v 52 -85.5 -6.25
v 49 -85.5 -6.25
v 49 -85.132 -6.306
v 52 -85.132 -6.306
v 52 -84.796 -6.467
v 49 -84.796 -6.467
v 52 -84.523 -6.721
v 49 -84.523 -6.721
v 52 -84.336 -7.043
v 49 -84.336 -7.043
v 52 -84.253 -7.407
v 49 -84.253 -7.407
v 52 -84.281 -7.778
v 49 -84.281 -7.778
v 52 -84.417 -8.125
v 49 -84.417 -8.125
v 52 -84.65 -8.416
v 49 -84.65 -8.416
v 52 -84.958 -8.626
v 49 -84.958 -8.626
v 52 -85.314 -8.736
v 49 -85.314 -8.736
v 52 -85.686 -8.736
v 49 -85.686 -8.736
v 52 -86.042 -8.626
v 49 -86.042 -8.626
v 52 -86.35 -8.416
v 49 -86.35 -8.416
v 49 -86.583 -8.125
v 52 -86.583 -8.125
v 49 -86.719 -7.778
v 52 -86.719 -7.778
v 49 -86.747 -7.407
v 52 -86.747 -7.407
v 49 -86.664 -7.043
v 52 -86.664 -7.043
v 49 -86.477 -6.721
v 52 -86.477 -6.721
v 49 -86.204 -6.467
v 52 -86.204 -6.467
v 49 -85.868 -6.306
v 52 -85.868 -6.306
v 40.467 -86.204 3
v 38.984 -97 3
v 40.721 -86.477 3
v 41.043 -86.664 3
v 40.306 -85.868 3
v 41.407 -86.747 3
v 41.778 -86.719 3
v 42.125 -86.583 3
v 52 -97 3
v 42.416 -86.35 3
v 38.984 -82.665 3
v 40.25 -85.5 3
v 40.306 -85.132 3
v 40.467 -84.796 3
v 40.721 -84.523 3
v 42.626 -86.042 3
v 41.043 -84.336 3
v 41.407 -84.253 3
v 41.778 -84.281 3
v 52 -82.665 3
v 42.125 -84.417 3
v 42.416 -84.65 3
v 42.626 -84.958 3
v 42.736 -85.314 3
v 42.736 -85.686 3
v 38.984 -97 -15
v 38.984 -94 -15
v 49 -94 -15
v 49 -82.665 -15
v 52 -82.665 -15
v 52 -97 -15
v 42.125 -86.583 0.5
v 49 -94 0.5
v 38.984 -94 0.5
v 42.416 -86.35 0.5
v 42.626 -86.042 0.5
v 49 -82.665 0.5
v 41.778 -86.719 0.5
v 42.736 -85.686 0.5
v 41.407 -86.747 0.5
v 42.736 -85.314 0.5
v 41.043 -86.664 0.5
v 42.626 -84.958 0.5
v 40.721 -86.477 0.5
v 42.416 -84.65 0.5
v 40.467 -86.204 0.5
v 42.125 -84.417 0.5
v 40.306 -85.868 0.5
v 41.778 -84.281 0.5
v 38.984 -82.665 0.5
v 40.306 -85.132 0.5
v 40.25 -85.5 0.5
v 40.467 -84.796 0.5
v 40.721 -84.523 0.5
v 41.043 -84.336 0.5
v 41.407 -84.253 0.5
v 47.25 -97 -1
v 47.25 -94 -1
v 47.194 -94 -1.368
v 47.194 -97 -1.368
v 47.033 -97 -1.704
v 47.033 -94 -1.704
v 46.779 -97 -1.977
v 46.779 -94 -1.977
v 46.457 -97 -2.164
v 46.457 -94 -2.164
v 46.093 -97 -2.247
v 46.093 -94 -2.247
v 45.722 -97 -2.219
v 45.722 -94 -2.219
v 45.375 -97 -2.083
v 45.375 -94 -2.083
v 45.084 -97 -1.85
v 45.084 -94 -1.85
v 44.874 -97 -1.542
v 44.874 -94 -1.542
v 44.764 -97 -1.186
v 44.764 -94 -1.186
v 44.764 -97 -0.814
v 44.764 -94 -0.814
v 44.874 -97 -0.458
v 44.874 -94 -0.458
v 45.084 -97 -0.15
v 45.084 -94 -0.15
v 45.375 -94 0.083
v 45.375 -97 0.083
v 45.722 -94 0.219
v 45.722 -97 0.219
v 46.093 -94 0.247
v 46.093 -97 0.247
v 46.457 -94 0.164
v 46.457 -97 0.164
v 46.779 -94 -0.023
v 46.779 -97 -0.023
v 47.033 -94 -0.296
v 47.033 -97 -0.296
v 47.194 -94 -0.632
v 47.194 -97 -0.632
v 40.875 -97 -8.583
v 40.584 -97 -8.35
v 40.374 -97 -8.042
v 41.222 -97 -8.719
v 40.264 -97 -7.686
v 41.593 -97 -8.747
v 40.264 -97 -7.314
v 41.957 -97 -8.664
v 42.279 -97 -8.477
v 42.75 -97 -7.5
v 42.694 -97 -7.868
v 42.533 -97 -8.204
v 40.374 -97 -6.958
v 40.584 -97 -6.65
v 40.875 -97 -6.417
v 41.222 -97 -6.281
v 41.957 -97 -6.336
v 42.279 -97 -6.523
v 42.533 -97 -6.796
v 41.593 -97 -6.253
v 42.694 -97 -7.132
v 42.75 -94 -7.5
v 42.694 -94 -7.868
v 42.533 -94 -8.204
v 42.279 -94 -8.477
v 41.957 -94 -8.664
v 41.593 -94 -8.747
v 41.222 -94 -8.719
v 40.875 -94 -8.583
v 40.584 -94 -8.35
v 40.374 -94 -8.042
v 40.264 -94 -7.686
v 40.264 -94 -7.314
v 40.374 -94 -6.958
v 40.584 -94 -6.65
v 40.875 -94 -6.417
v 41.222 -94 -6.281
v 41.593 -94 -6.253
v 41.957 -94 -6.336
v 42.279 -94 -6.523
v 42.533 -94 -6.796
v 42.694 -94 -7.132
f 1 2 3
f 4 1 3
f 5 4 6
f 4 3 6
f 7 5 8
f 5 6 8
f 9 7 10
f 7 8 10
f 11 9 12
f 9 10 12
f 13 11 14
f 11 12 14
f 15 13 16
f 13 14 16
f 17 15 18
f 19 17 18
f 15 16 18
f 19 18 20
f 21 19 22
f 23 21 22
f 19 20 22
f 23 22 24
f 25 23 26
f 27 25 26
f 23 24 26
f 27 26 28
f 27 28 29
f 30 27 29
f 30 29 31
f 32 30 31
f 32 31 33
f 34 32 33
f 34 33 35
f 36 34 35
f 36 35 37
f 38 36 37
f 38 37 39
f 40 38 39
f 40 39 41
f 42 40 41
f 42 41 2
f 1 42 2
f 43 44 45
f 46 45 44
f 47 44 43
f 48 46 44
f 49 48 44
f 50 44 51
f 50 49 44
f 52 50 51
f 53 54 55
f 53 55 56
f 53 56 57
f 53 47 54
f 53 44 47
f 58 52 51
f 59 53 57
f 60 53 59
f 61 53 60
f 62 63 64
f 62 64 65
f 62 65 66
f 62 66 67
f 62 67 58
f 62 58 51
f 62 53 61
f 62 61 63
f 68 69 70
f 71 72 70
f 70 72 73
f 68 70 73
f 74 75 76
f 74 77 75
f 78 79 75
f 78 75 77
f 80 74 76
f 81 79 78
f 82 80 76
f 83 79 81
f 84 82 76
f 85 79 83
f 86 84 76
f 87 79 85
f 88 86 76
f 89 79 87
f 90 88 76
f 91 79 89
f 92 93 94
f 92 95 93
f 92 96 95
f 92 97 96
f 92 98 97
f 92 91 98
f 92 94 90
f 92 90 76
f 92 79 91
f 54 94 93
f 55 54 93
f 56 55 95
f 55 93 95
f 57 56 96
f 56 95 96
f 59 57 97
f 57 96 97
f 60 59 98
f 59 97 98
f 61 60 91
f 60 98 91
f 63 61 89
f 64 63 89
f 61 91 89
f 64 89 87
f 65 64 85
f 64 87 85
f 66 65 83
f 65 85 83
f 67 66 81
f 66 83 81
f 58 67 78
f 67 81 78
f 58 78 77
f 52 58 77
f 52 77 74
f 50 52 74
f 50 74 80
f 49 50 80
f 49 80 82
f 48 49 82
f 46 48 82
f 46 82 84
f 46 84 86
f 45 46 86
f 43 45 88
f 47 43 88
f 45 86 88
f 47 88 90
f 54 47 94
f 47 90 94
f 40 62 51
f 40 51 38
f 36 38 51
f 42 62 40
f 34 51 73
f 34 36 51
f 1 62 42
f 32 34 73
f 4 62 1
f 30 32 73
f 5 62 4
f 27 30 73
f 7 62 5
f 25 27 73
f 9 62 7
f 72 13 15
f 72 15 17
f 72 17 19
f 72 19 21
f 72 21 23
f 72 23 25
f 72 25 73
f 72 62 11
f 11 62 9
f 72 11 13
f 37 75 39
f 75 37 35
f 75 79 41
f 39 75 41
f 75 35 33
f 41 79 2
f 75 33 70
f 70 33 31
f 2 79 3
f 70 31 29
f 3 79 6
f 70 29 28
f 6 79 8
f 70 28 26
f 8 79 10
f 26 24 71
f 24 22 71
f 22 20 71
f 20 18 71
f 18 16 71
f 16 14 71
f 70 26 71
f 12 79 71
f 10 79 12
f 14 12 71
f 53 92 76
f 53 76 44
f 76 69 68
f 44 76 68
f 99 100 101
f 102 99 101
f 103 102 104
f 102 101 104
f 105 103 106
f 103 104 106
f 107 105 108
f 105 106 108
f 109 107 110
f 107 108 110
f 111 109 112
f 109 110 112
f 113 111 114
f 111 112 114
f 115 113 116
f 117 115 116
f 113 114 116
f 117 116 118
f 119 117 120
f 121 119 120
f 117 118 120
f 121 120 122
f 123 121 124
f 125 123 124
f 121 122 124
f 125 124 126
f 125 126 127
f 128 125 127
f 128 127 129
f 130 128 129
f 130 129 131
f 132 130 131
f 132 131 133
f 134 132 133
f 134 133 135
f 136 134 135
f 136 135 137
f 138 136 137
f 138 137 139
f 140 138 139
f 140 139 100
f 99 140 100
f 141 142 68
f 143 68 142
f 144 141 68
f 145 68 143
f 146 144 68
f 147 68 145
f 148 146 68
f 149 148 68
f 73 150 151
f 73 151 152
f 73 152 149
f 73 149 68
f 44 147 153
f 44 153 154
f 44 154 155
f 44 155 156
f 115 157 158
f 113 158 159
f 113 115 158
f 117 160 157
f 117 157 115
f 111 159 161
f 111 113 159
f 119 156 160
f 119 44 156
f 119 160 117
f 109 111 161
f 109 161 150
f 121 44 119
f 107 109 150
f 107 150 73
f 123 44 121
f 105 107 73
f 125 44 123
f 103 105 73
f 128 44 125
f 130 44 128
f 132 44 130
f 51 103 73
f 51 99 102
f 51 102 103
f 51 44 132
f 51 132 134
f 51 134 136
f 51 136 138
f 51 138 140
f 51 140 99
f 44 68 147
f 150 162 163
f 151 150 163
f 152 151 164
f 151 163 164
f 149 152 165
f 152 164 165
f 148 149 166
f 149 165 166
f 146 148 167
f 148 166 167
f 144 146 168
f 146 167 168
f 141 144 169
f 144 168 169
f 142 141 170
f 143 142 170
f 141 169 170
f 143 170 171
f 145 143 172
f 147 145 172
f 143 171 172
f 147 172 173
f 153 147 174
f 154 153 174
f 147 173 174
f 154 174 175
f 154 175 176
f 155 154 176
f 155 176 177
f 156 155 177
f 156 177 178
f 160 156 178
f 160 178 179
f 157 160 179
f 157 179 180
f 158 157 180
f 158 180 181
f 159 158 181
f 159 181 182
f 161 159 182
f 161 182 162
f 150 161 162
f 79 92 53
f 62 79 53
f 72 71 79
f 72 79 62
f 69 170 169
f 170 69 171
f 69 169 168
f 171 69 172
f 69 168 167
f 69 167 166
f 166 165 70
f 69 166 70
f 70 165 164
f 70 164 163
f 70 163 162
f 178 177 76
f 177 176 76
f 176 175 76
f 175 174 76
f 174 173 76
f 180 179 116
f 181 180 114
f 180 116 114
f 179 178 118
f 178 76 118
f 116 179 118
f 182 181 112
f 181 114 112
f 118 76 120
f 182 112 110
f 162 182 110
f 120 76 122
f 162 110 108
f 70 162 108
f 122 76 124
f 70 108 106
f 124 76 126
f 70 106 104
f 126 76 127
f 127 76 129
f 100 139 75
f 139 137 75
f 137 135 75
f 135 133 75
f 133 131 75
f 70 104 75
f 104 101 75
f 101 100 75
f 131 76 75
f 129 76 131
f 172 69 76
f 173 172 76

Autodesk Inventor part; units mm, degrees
ref_plane "YZ Plane" through (0, 0, 0) normal (1, 0, 0) x (0, 1, 0)
ref_plane "XZ Plane" through (0, 0, 0) normal (0, 1, 0) x (-1, 0, 0)
ref_plane "XY Plane" through (0, 0, 0) normal (0, 0, 1) x (1, 0, 0)
ref_plane "작업 평면1" through (0, 0, 0) normal (0, 0, 1) x (1, 0, 0)
sketch "스케치1" plane through (0, 0, 0) normal (0, 0, 1) x (1, 0, 0)
  line L0 (49, -94) -> (-72, -94) construction
  line L1 (49, -88) -> (49, -94) construction
  line L2 (-72, -88) -> (49, -88) construction
  line L3 (-72, -94) -> (-72, -88) construction
  line L4 (43, 88) -> (43, -88) construction
  line L5 (49, -88) -> (43, -88) construction
  line L6 (49, 88) -> (49, -88) construction
  line L7 (49, 88) -> (43, 88) construction
  line L8 (-72, -88) -> (43, -88) construction
  line L9 (43, -88) -> (43, 88) construction
  line L10 (-72, 88) -> (43, 88) construction
  line L11 (-72, 88) -> (-72, -88) construction
  circle A0 centre (-2.8299, 17.3) radius 1.35 construction
  circle A1 centre (19.1701, -17.3) radius 1.35 construction
  circle A2 centre (-24.8299, 17.3) radius 1.35 construction
  circle A3 centre (19.1701, 17.3) radius 1.35 construction
  circle A4 centre (-2.8299, -17.3) radius 1.35 construction
  circle A5 centre (-24.8299, -17.3) radius 1.35 construction
  arc A6 (-27.4299, -13.5) -> (-26.3299, -14.6) centre (-26.3299, -13.5) ccw construction
  line L12 (-27.4299, -13.5) -> (-27.4299, 13.5) construction
  arc A7 (-26.3299, 14.6) -> (-27.4299, 13.5) centre (-26.3299, 13.5) ccw construction
  line L13 (-26.3299, 14.6) -> (28.6701, 14.6) construction
  line L14 (28.6701, 14.6) -> (28.6701, -14.6) construction
  line L15 (28.6701, -14.6) -> (-26.3299, -14.6) construction
  line L16 (-72, -88) -> (43, -88) construction
  line L17 (43, -88) -> (43, 88) construction
  line L18 (-72, 88) -> (43, 88) construction
  line L19 (-72, 88) -> (-72, -88) construction
  circle A8 centre (-2.8299, 17.3) radius 1.35 construction
  circle A9 centre (19.1701, -17.3) radius 1.35 construction
  circle A10 centre (-24.8299, 17.3) radius 1.35 construction
  circle A11 centre (19.1701, 17.3) radius 1.35 construction
  circle A12 centre (-2.8299, -17.3) radius 1.35 construction
  circle A13 centre (-24.8299, -17.3) radius 1.35 construction
  arc A14 (-27.4299, -13.5) -> (-26.3299, -14.6) centre (-26.3299, -13.5) ccw construction
  line L20 (-27.4299, -13.5) -> (-27.4299, 13.5) construction
  arc A15 (-26.3299, 14.6) -> (-27.4299, 13.5) centre (-26.3299, 13.5) ccw construction
  line L21 (-26.3299, 14.6) -> (28.6701, 14.6) construction
  line L22 (28.6701, 14.6) -> (28.6701, -14.6) construction
  line L23 (28.6701, -14.6) -> (-26.3299, -14.6) construction
  line L24 (43, 88) -> (43, -88) projected
  line L25 (49, -88) -> (43, -88) projected
  line L26 (49, 88) -> (49, -88) projected
  line L27 (49, 88) -> (43, 88) projected
  line L28 (49, -94) -> (-72, -94) projected
  line L29 (49, -88) -> (49, -94) projected
  line L30 (-72, -88) -> (49, -88) projected
  line L31 (-72, -94) -> (-72, -88) projected
  line L32 (-72, -88) -> (43, -88) projected
  line L33 (43, -88) -> (43, 88) projected
  line L34 (-72, 88) -> (43, 88) projected
  line L35 (-72, 88) -> (-72, -88) projected
  circle A16 centre (-2.8299, 17.3) radius 1.35 projected
  circle A17 centre (19.1701, -17.3) radius 1.35 projected
  circle A18 centre (-24.8299, 17.3) radius 1.35 projected
  circle A19 centre (19.1701, 17.3) radius 1.35 projected
  circle A20 centre (-2.8299, -17.3) radius 1.35 projected
  circle A21 centre (-24.8299, -17.3) radius 1.35 projected
  arc A22 (-27.4299, -13.5) -> (-26.3299, -14.6) centre (-26.3299, -13.5) ccw projected
  line L36 (-27.4299, -13.5) -> (-27.4299, 13.5) projected
  arc A23 (-26.3299, 14.6) -> (-27.4299, 13.5) centre (-26.3299, 13.5) ccw projected
  line L37 (-26.3299, 14.6) -> (28.6701, 14.6) projected
  line L38 (28.6701, 14.6) -> (28.6701, -14.6) projected
  line L39 (28.6701, -14.6) -> (-26.3299, -14.6) projected
  line L40 (49, -94) -> (-72, -94) projected
  line L41 (49, -88) -> (49, -94) projected
  line L42 (-72, -88) -> (49, -88) projected
  line L43 (-72, -94) -> (-72, -88) projected
  line L44 (49, -94) -> (49, -77)
  line L45 (49, -94) -> (32, -94)
  line L46 (49, -77) -> (43, -77)
  line L47 (32, -94) -> (32, -88)
  line L48 (49, -94) -> (32, -94)
  line L49 (32, -94) -> (32, -77)
  line L50 (32, -77) -> (49, -77)
  line L51 (49, -77) -> (49, -94)
  line L52 (49, -94) -> (29, -94)
  line L53 (29, -94) -> (29, -77)
  line L54 (29, -77) -> (49, -77)
  line L55 (49, -77) -> (49, -94)
  point P0 (0, 0)
  dimension "d0" = 17
  dimension "d1" = 17
  dimension "d28" = 20
extrude "돌출1" add sketch "스케치1" along normal blind 3 contours L46 L26 L25 L24 | L24 L30 L49 L50 | L25 L29 L28 L47 L30 | L49 L30 L53 L54 | L47 L28 L53 L30
sketch "스케치2" plane through (49, -94, 0) normal (1, 0, 0) x (0, 0, -1)
  line L0 (40.7085, 16) -> (17.2915, 16) projected
  arc A0 (16.3174, 17.226) -> (17.2915, 16) centre (17.2915, 17) ccw projected
  line L1 (16.3174, 17.226) -> (28.0259, 67.6827) projected
  arc A1 (29.9741, 67.6827) -> (28.0259, 67.6827) centre (29, 67.4566) ccw projected
  line L2 (29.9741, 67.6827) -> (41.6826, 17.226) projected
  arc A2 (40.7085, 16) -> (41.6826, 17.226) centre (40.7085, 17) ccw projected
  line L3 (34.1853, 94.226) -> (45.1259, 141.3733) projected
  arc A3 (47.1, 141.1472) -> (45.1259, 141.3733) centre (46.1, 141.1472) ccw projected
  line L4 (47.1, 141.1472) -> (47.1, 46.8528) projected
  arc A4 (45.1259, 46.6267) -> (47.1, 46.8528) centre (46.1, 46.8528) ccw projected
  line L5 (45.1259, 46.6267) -> (34.1853, 93.774) projected
  arc A5 (34.1853, 94.226) -> (34.1853, 93.774) centre (35.1594, 94) ccw projected
  line L6 (10.9, 46.8528) -> (10.9, 141.1472) projected
  arc A6 (12.8741, 141.3733) -> (10.9, 141.1472) centre (11.9, 141.1472) ccw projected
  line L7 (12.8741, 141.3733) -> (23.8147, 94.226) projected
  arc A7 (23.8147, 93.774) -> (23.8147, 94.226) centre (22.8406, 94) ccw projected
  line L8 (23.8147, 93.774) -> (12.8741, 46.6267) projected
  arc A8 (10.9, 46.8528) -> (12.8741, 46.6267) centre (11.9, 46.8528) ccw projected
  line L9 (28.0259, 120.3173) -> (16.3174, 170.774) projected
  arc A9 (17.2915, 172) -> (16.3174, 170.774) centre (17.2915, 171) ccw projected
  line L10 (17.2915, 172) -> (40.7085, 172) projected
  arc A10 (41.6826, 170.774) -> (40.7085, 172) centre (40.7085, 171) ccw projected
  line L11 (41.6826, 170.774) -> (29.9741, 120.3173) projected
  arc A11 (28.0259, 120.3173) -> (29.9741, 120.3173) centre (29, 120.5434) ccw projected
  line L12 (58, 182) -> (0, 182) projected
  line L13 (0, 182) -> (0, 6) projected
  line L14 (58, 6) -> (0, 6) projected
  line L15 (58, 6) -> (58, 182) projected
  line L16 (58, 0) -> (0, 0) projected
  line L17 (58, 6) -> (58, 0) projected
  line L18 (0, 6) -> (58, 6) projected
  line L19 (0, 6) -> (0, 0) projected
  line L20 (6, 182) -> (6, 6) projected
  line L21 (0, 0) -> (0, 17) projected
  line L22 (0, 17) -> (-3, 17) projected
  line L23 (-3, 0) -> (-3, 17) projected
  line L24 (0, 0) -> (-3, 0) projected
  line L25 (-3, 0) -> (22, 0)
  line L26 (22, 0) -> (22, 17)
  line L27 (22, 17) -> (-3, 17)
  line L28 (-3, 17) -> (-3, 0)
  point P0 (0, 94)
  point P1 (0, 0)
  point P2 (22, 0)
  point P3 (22, 16)
  point P4 (16.2915, 17)
  point P5 (0, 17)
  dimension "d4" = 25
extrude "돌출2" add sketch "스케치2" along normal blind 3 contours L26 L14 L20 L27 A0 L0 | L0 A0 L27 L26 | L26 L16 L19 L14 | L14 L13 L27 L20 | L19 L24 L23 L22 L13
sketch "스케치3" plane through (32, -94, 0) normal (0, -1, 0) x (1, 0, 0)
  line L0 (20, 3) -> (20, -22) projected
  line L1 (0, 0) -> (0, 3) projected
  line L2 (20, -22) -> (0, -22)
  line L3 (0, -22) -> (0, 3)
  line L4 (0, 3) -> (20, 3)
  line L5 (20, 3) -> (20, -22)
  line L6 (20, 3) -> (-3, 3)
  line L7 (-3, 3) -> (-3, -22)
  line L8 (-3, -22) -> (20, -22)
  line L9 (20, -22) -> (20, 3)
  point P0 (-32, 0)
  point P1 (20, 3)
  point P2 (0, -22)
  dimension "d27" = 23
extrude "돌출3" add sketch "스케치3" along normal blind 3
sketch "스케치8" plane through (0, 0, 3) normal (0, 0, 1) x (1, 0, 0)
  line L0 (29, -97) -> (52, -97) projected
  line L1 (29, -77) -> (52, -77) projected
  line L2 (52, -97) -> (34, -97)
  line L3 (34, -97) -> (34, -77)
  line L4 (34, -77) -> (52, -77)
  line L5 (52, -77) -> (52, -97)
  line L6 (34, -77) -> (29, -77)
  line L7 (29, -77) -> (29, -97)
  line L8 (29, -97) -> (34, -97)
  line L9 (34, -97) -> (34, -77)
  point P0 (0, 0)
  dimension "d29" = 18
extrude "돌출8" cut sketch "스케치8" against normal blind 50 contours L7 L1 L3 L0
sketch "스케치10" plane through (52, -94, 0) normal (1, 0, 0) x (0, 0, -1)
  line L0 (-3, 17) -> (-3, -3) projected
  line L1 (22, -3) -> (-3, -3) projected
  line L2 (-3, 17) -> (17, 17)
  line L3 (17, 17) -> (17, -3)
  line L4 (17, -3) -> (-3, -3)
  line L5 (-3, -3) -> (-3, 17)
  line L6 (-3, 17) -> (15, 17)
  line L7 (15, 17) -> (15, -3)
  line L8 (15, -3) -> (-3, -3)
  line L9 (-3, -3) -> (-3, 17)
  line L10 (15, 17) -> (22, 17)
  line L11 (22, 17) -> (22, -3)
  line L12 (22, -3) -> (15, -3)
  line L13 (15, -3) -> (15, 17)
  point P0 (0, 94)
  point P1 (15, 17)
  point P2 (17, 17)
  dimension "d32" = 20
  dimension "d33" = 18
extrude "돌출9" cut sketch "스케치10" against normal blind 50 contours L2 L3 L1 L7 | L10 L11 L1 L3
sketch "스케치12" plane through (32, -94, 0) normal (0, 1, 0) x (1, 0, 0)
  circle A0 centre (14, 1) radius 1.25 projected
  circle A1 centre (8, 17) radius 1.25 projected
  circle A2 centre (8, 1) radius 1.25 projected
  circle A3 centre (14, 17) radius 1.25 projected
  line L0 (4, -3) -> (20, -3) projected
  line L1 (20, 21) -> (20, -3) projected
  line L2 (4, 21) -> (20, 21) projected
  line L3 (4, 21) -> (4, -3) projected
  circle A4 centre (14, 1) radius 1.25 projected
  arc A5 (8.2846, 1.2694) -> (7.5179, 0.8668) centre (7.785, 1.2894) ccw projected
  point P0 (-32, 0)
extrude "돌출10" cut sketch "스케치12" against normal blind 50 contours A0
sketch "스케치13" plane through (0, 0, 0) normal (0, 0, -1) x (-1, 0, 0)
  line L0 (-34, -94) -> (-34, -77) projected
  line L1 (-49, -77) -> (-34, -77) projected
  line L2 (-49, -94) -> (-49, -77) projected
  line L3 (-46.75, -94) -> (-49, -94) projected
  line L4 (-45.25, -94) -> (-46.75, -94) projected
  line L5 (-34, -94) -> (-45.25, -94) projected
  line L6 (-41.5, -94) -> (-41.5, -77)
  line L7 (-34, -85.5) -> (-49, -85.5)
  circle A0 centre (-41.5, -85.5) radius 1.25
  point P0 (0, 0)
  dimension "d38" = 2.5
extrude "돌출11" cut sketch "스케치13" against normal blind 50 contours A0 L6 L7 | L7 L6 A0 | A0 L7 L6 | L7 A0 L6
sketch "스케치14" plane through (49, -94, 0) normal (-1, 0, 0) x (0, 0, 1)
  line L0 (-15, 17) -> (-15, 0) projected
  line L1 (0, 0) -> (-15, 0) projected
  line L2 (0, 0) -> (0, 17) projected
  line L3 (-15, 17) -> (0, 17) projected
  line L4 (-15, 8.5) -> (0, 8.5)
  line L5 (0, 0) -> (-15, 0) projected
  line L6 (-7.5, 0) -> (-7.5, 17)
  circle A0 centre (-7.5, 8.5) radius 1.25
  point P0 (0, 94)
  dimension "d41" = 2.5
extrude "돌출12" cut sketch "스케치14" against normal blind 50 contours A0 L6 L4 | L4 L6 A0 | A0 L4 L6 | L4 A0 L6
sketch "스케치15" plane through (32, -94, 0) normal (0, 1, 0) x (1, 0, 0)
  line L0 (2, 0) -> (13.25, 0) projected
  arc A0 (14.75, 0) -> (13.25, 0) centre (14, 1) ccw projected
  line L1 (14.75, 0) -> (17, 0) projected
  line L2 (17, 0) -> (17, 15) projected
  line L3 (17, 15) -> (2, 15) projected
  line L4 (2, 15) -> (2, 0) projected
  line L5 (9.5, 15) -> (9.5, 0)
  line L6 (8.75, 0) -> (13.25, 0) projected
  line L7 (2, 15) -> (2, 0) projected
  line L8 (2, 7.5) -> (17, 7.5)
  circle A1 centre (9.5, 7.5) radius 1.25
  point P0 (-32, 0)
  dimension "d44" = 2.5
extrude "돌출13" cut sketch "스케치15" against normal blind 50 contours A1 L5 L8 | L8 L5 A1 | L5 L8 A1 | L5 A1 L8
sketch "스케치16" plane through (0, 0, 0) normal (0, 0, -1) x (-1, 0, 0)
  circle A0 centre (-41.5, -85.5) radius 1.25 projected
  line L0 (-34, -94) -> (-34, -77) projected
  line L1 (-49, -77) -> (-34, -77) projected
  line L2 (-49, -94) -> (-49, -77) projected
  line L3 (-46.75, -94) -> (-49, -94) projected
  line L4 (-45.25, -94) -> (-46.75, -94) projected
  line L5 (-34, -94) -> (-45.25, -94) projected
  point P0 (0, 0)
extrude "돌출14" cut sketch "스케치16" against normal blind 0.5
sketch "스케치17" plane through (52, -97, -15) normal (0, 0, -1) x (-1, 0, 0)
  line L0 (18, 20) -> (18, 0) projected
  line L1 (0, 0) -> (18, 0) projected
  line L2 (18, 20) -> (13.0164, 20)
  line L3 (13.0164, 20) -> (13.0164, 0)
  line L4 (13.0164, 0) -> (18, 0)
  line L5 (18, 0) -> (18, 20)
  point P0 (52, 97)
extrude "돌출15" cut sketch "스케치17" against normal blind 50
sketch "스케치18" plane through (52, -97, -15) normal (0, 0, -1) x (-1, 0, 0)
  line L0 (0, 20) -> (0, 0) projected
  line L1 (13.0164, 20) -> (13.0164, 0) projected
  line L2 (0, 20) -> (13.0164, 20)
  line L3 (13.0164, 20) -> (13.0164, 14.3347)
  line L4 (13.0164, 14.3347) -> (0, 14.3347)
  line L5 (0, 14.3347) -> (0, 20)
  point P0 (52, 97)
extrude "돌출16" cut sketch "스케치18" against normal blind 50
properties part number "body_fitting_part_under" material "LCP 플라스틱"
